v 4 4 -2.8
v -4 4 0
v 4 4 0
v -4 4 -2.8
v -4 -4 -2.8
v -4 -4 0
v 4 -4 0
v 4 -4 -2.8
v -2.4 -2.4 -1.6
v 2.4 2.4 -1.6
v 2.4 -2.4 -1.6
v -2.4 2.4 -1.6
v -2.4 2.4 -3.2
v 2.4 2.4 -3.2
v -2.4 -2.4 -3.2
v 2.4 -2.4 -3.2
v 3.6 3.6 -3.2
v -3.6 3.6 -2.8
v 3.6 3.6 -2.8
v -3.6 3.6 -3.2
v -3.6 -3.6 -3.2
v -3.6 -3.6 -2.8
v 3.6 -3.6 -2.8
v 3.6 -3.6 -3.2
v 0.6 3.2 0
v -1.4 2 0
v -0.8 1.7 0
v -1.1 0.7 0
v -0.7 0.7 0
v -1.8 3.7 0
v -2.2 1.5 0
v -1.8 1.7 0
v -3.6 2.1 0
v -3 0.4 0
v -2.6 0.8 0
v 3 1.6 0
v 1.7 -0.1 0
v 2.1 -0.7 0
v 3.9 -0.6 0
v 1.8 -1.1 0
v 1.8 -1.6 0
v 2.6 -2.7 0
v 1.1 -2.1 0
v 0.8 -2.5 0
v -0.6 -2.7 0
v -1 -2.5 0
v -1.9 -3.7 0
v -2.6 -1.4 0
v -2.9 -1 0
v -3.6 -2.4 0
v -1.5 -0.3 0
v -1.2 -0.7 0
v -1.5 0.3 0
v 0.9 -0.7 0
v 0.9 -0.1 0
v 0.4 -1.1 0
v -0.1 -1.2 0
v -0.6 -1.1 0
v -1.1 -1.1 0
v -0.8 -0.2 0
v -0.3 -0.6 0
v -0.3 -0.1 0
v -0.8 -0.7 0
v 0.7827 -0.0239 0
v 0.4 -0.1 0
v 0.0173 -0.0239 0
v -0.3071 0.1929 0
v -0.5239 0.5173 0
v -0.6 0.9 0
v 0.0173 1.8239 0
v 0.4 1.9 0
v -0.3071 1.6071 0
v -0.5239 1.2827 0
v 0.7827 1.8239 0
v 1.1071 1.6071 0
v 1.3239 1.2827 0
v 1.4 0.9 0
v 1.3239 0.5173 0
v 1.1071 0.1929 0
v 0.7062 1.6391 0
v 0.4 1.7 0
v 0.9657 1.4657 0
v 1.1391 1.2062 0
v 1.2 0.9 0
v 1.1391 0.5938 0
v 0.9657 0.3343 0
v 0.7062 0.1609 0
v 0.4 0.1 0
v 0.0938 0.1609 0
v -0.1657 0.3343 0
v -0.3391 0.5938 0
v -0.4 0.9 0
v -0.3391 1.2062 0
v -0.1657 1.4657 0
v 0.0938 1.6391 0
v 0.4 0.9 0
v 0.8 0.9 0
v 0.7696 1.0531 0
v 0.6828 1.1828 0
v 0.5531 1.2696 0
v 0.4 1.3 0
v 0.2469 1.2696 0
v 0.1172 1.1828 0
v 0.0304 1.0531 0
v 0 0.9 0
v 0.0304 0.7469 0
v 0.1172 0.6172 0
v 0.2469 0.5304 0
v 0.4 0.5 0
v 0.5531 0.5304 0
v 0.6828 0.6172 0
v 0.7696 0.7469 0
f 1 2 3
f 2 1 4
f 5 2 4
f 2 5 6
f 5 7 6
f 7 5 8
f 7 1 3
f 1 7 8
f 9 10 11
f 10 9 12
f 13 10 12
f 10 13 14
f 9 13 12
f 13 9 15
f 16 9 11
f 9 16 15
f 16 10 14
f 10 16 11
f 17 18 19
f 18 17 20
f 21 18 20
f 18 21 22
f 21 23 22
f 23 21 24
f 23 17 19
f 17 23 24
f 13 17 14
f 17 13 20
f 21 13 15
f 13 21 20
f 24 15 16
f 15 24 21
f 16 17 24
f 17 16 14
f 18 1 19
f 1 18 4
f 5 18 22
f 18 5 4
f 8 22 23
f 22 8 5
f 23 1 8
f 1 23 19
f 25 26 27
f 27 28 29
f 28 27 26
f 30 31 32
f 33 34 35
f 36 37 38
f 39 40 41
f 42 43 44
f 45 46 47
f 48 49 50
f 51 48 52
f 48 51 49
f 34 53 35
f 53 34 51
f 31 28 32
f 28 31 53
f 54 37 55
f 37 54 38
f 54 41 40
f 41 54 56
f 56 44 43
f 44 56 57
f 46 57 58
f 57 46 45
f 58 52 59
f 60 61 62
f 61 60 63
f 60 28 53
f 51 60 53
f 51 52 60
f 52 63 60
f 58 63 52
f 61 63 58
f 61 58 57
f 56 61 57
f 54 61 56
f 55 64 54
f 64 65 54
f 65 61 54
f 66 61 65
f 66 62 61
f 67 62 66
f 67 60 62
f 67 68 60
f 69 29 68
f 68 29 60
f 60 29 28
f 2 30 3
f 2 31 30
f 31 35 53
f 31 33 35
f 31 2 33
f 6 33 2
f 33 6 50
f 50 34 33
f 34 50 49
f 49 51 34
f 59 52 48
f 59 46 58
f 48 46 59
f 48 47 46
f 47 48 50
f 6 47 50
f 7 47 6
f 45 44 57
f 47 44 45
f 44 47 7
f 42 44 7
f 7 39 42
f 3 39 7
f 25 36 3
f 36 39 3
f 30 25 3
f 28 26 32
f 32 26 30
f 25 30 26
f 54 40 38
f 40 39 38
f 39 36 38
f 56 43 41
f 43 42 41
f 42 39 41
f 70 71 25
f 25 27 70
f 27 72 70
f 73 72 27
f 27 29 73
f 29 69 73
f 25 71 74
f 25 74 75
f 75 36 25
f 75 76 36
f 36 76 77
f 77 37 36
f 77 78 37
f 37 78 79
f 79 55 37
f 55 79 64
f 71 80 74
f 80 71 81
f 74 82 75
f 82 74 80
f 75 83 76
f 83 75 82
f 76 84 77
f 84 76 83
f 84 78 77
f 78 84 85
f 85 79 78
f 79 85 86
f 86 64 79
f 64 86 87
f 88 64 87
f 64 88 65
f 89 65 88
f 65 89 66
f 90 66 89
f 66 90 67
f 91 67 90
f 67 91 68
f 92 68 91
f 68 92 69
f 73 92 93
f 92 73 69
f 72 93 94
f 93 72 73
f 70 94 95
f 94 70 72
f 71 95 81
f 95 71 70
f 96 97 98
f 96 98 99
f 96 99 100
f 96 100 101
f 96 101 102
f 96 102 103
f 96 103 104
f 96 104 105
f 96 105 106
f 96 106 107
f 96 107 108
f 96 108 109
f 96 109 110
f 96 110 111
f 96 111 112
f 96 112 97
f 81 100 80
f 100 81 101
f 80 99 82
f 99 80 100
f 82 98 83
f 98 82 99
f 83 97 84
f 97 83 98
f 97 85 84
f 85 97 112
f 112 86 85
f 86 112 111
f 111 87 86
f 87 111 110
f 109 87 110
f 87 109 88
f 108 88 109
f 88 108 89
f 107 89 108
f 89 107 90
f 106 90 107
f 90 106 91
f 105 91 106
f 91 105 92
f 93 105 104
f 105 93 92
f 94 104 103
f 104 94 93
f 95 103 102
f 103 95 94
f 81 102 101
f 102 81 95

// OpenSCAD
// file: ../p/box5.scad
use <../lib.scad>
function ldraw_lib__box5() = [
// 0 Box with 5 Faces and All Edges
// 0 Name: box5.dat
// 0 Author: James Jessiman
// 0 !LDRAW_ORG Primitive UPDATE 2012-01
// 0 !LICENSE Licensed under CC BY 2.0 and CC BY 4.0 : see CAreadme.txt
// 
// 0 BFC CERTIFY CCW
  [0,"BFC","CERTIFY"],
  [0,"BFC","CCW"],
// 
// 0 !HISTORY 2002-04-03 [sbliss] Modified for BFC compliance
// 0 !HISTORY 2002-04-25 [PTadmin] Official Update 2002-02
// 0 !HISTORY 2007-06-24 [PTadmin] Header formatted for Contributor Agreement
// 0 !HISTORY 2008-07-01 [PTadmin] Official Update 2008-01
// 0 !HISTORY 2012-02-16 [Philo] Changed to CCW
// 0 !HISTORY 2012-03-30 [PTadmin] Official Update 2012-01
// 
// 
// 2 24 1 1 1 -1 1 1
  [2,24,1,1,1,-1,1,1],
// 2 24 -1 1 1 -1 1 -1
  [2,24,-1,1,1,-1,1,-1],
// 2 24 -1 1 -1 1 1 -1
  [2,24,-1,1,-1,1,1,-1],
// 2 24 1 1 -1 1 1 1
  [2,24,1,1,-1,1,1,1],
// 2 24 1 0 1 -1 0 1
  [2,24,1,0,1,-1,0,1],
// 2 24 -1 0 1 -1 0 -1
  [2,24,-1,0,1,-1,0,-1],
// 2 24 -1 0 -1 1 0 -1
  [2,24,-1,0,-1,1,0,-1],
// 2 24 1 0 -1 1 0 1
  [2,24,1,0,-1,1,0,1],
// 2 24 1 0 1 1 1 1
  [2,24,1,0,1,1,1,1],
// 2 24 -1 0 1 -1 1 1
  [2,24,-1,0,1,-1,1,1],
// 2 24 1 0 -1 1 1 -1
  [2,24,1,0,-1,1,1,-1],
// 2 24 -1 0 -1 -1 1 -1
  [2,24,-1,0,-1,-1,1,-1],
// 4 16 -1 1 1 1 1 1 1 1 -1 -1 1 -1
  [4,16,-1,1,1,1,1,1,1,1,-1,-1,1,-1],
// 4 16 -1 1 1 -1 0 1 1 0 1 1 1 1
  [4,16,-1,1,1,-1,0,1,1,0,1,1,1,1],
// 4 16 -1 1 -1 -1 0 -1 -1 0 1 -1 1 1
  [4,16,-1,1,-1,-1,0,-1,-1,0,1,-1,1,1],
// 4 16 1 1 -1 1 0 -1 -1 0 -1 -1 1 -1
  [4,16,1,1,-1,1,0,-1,-1,0,-1,-1,1,-1],
// 4 16 1 1 1 1 0 1 1 0 -1 1 1 -1
  [4,16,1,1,1,1,0,1,1,0,-1,1,1,-1],
];
makepoly(ldraw_lib__box5(), line=0.2);
// file: ../p/box4.scad
use <../lib.scad>
function ldraw_lib__box4() = [
// 0 Box with 4 Faces (2 Parallel Pairs) and All Edges
// 0 Name: box4.dat
// 0 Author: James Jessiman
// 0 !LDRAW_ORG Primitive UPDATE 2012-01
// 0 !LICENSE Licensed under CC BY 2.0 and CC BY 4.0 : see CAreadme.txt
// 
// 0 BFC CERTIFY CCW
  [0,"BFC","CERTIFY"],
  [0,"BFC","CCW"],
// 
// 0 !HISTORY 2002-04-03 [sbliss] Modified for BFC compliance
// 0 !HISTORY 2002-04-25 [PTadmin] Official Update 2002-02
// 0 !HISTORY 2007-06-24 [PTadmin] Header formatted for Contributor Agreement
// 0 !HISTORY 2008-07-01 [PTadmin] Official Update 2008-01
// 0 !HISTORY 2012-02-16 [Philo] Changed to CCW
// 0 !HISTORY 2012-03-30 [PTadmin] Official Update 2012-01
// 
// 
// 2 24 1 1 1 -1 1 1
  [2,24,1,1,1,-1,1,1],
// 2 24 -1 1 1 -1 1 -1
  [2,24,-1,1,1,-1,1,-1],
// 2 24 -1 1 -1 1 1 -1
  [2,24,-1,1,-1,1,1,-1],
// 2 24 1 1 -1 1 1 1
  [2,24,1,1,-1,1,1,1],
// 2 24 1 0 1 -1 0 1
  [2,24,1,0,1,-1,0,1],
// 2 24 -1 0 1 -1 0 -1
  [2,24,-1,0,1,-1,0,-1],
// 2 24 -1 0 -1 1 0 -1
  [2,24,-1,0,-1,1,0,-1],
// 2 24 1 0 -1 1 0 1
  [2,24,1,0,-1,1,0,1],
// 2 24 1 0 1 1 1 1
  [2,24,1,0,1,1,1,1],
// 2 24 -1 0 1 -1 1 1
  [2,24,-1,0,1,-1,1,1],
// 2 24 1 0 -1 1 1 -1
  [2,24,1,0,-1,1,1,-1],
// 2 24 -1 0 -1 -1 1 -1
  [2,24,-1,0,-1,-1,1,-1],
// 4 16 -1 1 1 -1 0 1 1 0 1 1 1 1
  [4,16,-1,1,1,-1,0,1,1,0,1,1,1,1],
// 4 16 -1 1 -1 -1 0 -1 -1 0 1 -1 1 1
  [4,16,-1,1,-1,-1,0,-1,-1,0,1,-1,1,1],
// 4 16 1 1 -1 1 0 -1 -1 0 -1 -1 1 -1
  [4,16,1,1,-1,1,0,-1,-1,0,-1,-1,1,-1],
// 4 16 1 1 1 1 0 1 1 0 -1 1 1 -1
  [4,16,1,1,1,1,0,1,1,0,-1,1,1,-1],
];
makepoly(ldraw_lib__box4(), line=0.2);
// file: s/3070bs01.scad
use <../../lib.scad>
use <../../p/box4.scad>
use <../../p/box5.scad>
function ldraw_lib__s__3070bs01() = [
// 0 ~Tile  1 x  1 with Groove without Top Face
// 0 Name: s\3070bs01.dat
// 0 Author: Chris Dee [cwdee]
// 0 !LDRAW_ORG Subpart UPDATE 2009-02
// 0 !LICENSE Licensed under CC BY 2.0 and CC BY 4.0 : see CAreadme.txt
// 
// 0 BFC CERTIFY CCW
  [0,"BFC","CERTIFY"],
  [0,"BFC","CCW"],
// 
// 0 !HISTORY 2009-09-03 [PTadmin] Official Update 2009-02
// 
// 
// 1 16 0 0 0 10 0 0 0 7 0 0 0 10 box4.dat
  [1,16,0,0,0,10,0,0,0,7,0,0,0,10, ldraw_lib__box4()],
// 0 BFC INVERTNEXT
  [0,"BFC","INVERTNEXT"],
// 1 16 0 8 0 6 0 0 0 -4 0 0 0 6 box5.dat
  [1,16,0,8,0,6,0,0,0,-4,0,0,0,6, ldraw_lib__box5()],
// 1 16 0 7 0 9 0 0 0 1 0 0 0 9 box4.dat
  [1,16,0,7,0,9,0,0,0,1,0,0,0,9, ldraw_lib__box4()],
// 
// 4 16 9 8 9 6 8 6 -6 8 6 -9 8 9
  [4,16,9,8,9,6,8,6,-6,8,6,-9,8,9],
// 4 16 -9 8 9 -6 8 6 -6 8 -6 -9 8 -9
  [4,16,-9,8,9,-6,8,6,-6,8,-6,-9,8,-9],
// 4 16 -9 8 -9 -6 8 -6 6 8 -6 9 8 -9
  [4,16,-9,8,-9,-6,8,-6,6,8,-6,9,8,-9],
// 4 16 9 8 -9 6 8 -6 6 8 6 9 8 9
  [4,16,9,8,-9,6,8,-6,6,8,6,9,8,9],
// 
// 4 16 10 7 10 9 7 9 -9 7 9 -10 7 10
  [4,16,10,7,10,9,7,9,-9,7,9,-10,7,10],
// 4 16 -10 7 10 -9 7 9 -9 7 -9 -10 7 -10
  [4,16,-10,7,10,-9,7,9,-9,7,-9,-10,7,-10],
// 4 16 -10 7 -10 -9 7 -9 9 7 -9 10 7 -10
  [4,16,-10,7,-10,-9,7,-9,9,7,-9,10,7,-10],
// 4 16 10 7 -10 9 7 -9 9 7 9 10 7 10
  [4,16,10,7,-10,9,7,-9,9,7,9,10,7,10],
// 0
];
makepoly(ldraw_lib__s__3070bs01(), line=0.2);
// file: ../p/4-4disc.scad
use <../lib.scad>
function ldraw_lib__4_4disc() = [
// 0 Disc 1.0
// 0 Name: 4-4disc.dat
// 0 Author: James Jessiman
// 0 !LDRAW_ORG Primitive UPDATE 2002-02
// 0 !LICENSE Licensed under CC BY 2.0 and CC BY 4.0 : see CAreadme.txt
// 
// 0 BFC CERTIFY CCW
  [0,"BFC","CERTIFY"],
  [0,"BFC","CCW"],
// 
// 0 !HISTORY 1998-12-15 [PTadmin] Official Update 1998-10
// 0 !HISTORY 2002-03-23 [sbliss] Added BFC statement
// 0 !HISTORY 2002-04-25 [PTadmin] Official Update 2002-02
// 0 !HISTORY 2007-06-24 [PTadmin] Header formatted for Contributor Agreement
// 0 !HISTORY 2008-07-01 [PTadmin] Official Update 2008-01
// 
// 
// 3 16 0 0 0 1 0 0 0.9239 0 0.3827
  [3,16,0,0,0,1,0,0,0.9239,0,0.3827],
// 3 16 0 0 0 0.9239 0 0.3827 0.7071 0 0.7071
  [3,16,0,0,0,0.9239,0,0.3827,0.7071,0,0.7071],
// 3 16 0 0 0 0.7071 0 0.7071 0.3827 0 0.9239
  [3,16,0,0,0,0.7071,0,0.7071,0.3827,0,0.9239],
// 3 16 0 0 0 0.3827 0 0.9239 0 0 1
  [3,16,0,0,0,0.3827,0,0.9239,0,0,1],
// 3 16 0 0 0 0 0 1 -0.3827 0 0.9239
  [3,16,0,0,0,0,0,1,-0.3827,0,0.9239],
// 3 16 0 0 0 -0.3827 0 0.9239 -0.7071 0 0.7071
  [3,16,0,0,0,-0.3827,0,0.9239,-0.7071,0,0.7071],
// 3 16 0 0 0 -0.7071 0 0.7071 -0.9239 0 0.3827
  [3,16,0,0,0,-0.7071,0,0.7071,-0.9239,0,0.3827],
// 3 16 0 0 0 -0.9239 0 0.3827 -1 0 -0
  [3,16,0,0,0,-0.9239,0,0.3827,-1,0,-0],
// 3 16 0 0 0 -1 0 -0 -0.9239 0 -0.3827
  [3,16,0,0,0,-1,0,-0,-0.9239,0,-0.3827],
// 3 16 0 0 0 -0.9239 0 -0.3827 -0.7071 0 -0.7071
  [3,16,0,0,0,-0.9239,0,-0.3827,-0.7071,0,-0.7071],
// 3 16 0 0 0 -0.7071 0 -0.7071 -0.3827 0 -0.9239
  [3,16,0,0,0,-0.7071,0,-0.7071,-0.3827,0,-0.9239],
// 3 16 0 0 0 -0.3827 0 -0.9239 0 0 -1
  [3,16,0,0,0,-0.3827,0,-0.9239,0,0,-1],
// 3 16 0 0 0 0 0 -1 0.3827 0 -0.9239
  [3,16,0,0,0,0,0,-1,0.3827,0,-0.9239],
// 3 16 0 0 0 0.3827 0 -0.9239 0.7071 0 -0.7071
  [3,16,0,0,0,0.3827,0,-0.9239,0.7071,0,-0.7071],
// 3 16 0 0 0 0.7071 0 -0.7071 0.9239 0 -0.3827
  [3,16,0,0,0,0.7071,0,-0.7071,0.9239,0,-0.3827],
// 3 16 0 0 0 0.9239 0 -0.3827 1 0 0
  [3,16,0,0,0,0.9239,0,-0.3827,1,0,0],
// 0
];
makepoly(ldraw_lib__4_4disc(), line=0.2);
// main file
use <../lib.scad>
use <3070bph0.scad>
function ldraw_lib__4178523() = [
// 0 ~_Tile  1 x  1 with Spider Pattern [378] (Obsolete)
// 0 Name: 4178523.dat
// 0 Author: [PTadmin]
// 0 !LDRAW_ORG Part Physical_Colour UPDATE 2019-02
// 0 !LICENSE Licensed under CC BY 2.0 and CC BY 4.0 : see CAreadme.txt
// 
// 0 BFC CERTIFY CCW
  [0,"BFC","CERTIFY"],
  [0,"BFC","CCW"],
// 
// 0 !HISTORY 2012-08-09 [PTadmin] Official Update 2012-02
// 0 !HISTORY 2012-08-11 [cwdee] Re-issue due to ommission from early downloads of 2012-02
// 0 !HISTORY 2012-12-28 [PTadmin] Official Update 2012-03
// 0 !HISTORY 2019-08-08 [Holly-Wood] Obsoleted per decision not to include physical colour parts
// 0 !HISTORY 2019-09-09 [PTadmin] Official Update 2019-02
// 
// 
// 0 // This file is a "shortcut" with the correct number for the actual
// 0 // colouring of the part (Sand Green).
// 
// 1 378 0 0 0 1 0 0 0 1 0 0 0 1 3070bph0.dat
  [1,378,0,0,0,1,0,0,0,1,0,0,0,1, ldraw_lib__3070bph0()],
];
makepoly(ldraw_lib__4178523(), line=0.2);
